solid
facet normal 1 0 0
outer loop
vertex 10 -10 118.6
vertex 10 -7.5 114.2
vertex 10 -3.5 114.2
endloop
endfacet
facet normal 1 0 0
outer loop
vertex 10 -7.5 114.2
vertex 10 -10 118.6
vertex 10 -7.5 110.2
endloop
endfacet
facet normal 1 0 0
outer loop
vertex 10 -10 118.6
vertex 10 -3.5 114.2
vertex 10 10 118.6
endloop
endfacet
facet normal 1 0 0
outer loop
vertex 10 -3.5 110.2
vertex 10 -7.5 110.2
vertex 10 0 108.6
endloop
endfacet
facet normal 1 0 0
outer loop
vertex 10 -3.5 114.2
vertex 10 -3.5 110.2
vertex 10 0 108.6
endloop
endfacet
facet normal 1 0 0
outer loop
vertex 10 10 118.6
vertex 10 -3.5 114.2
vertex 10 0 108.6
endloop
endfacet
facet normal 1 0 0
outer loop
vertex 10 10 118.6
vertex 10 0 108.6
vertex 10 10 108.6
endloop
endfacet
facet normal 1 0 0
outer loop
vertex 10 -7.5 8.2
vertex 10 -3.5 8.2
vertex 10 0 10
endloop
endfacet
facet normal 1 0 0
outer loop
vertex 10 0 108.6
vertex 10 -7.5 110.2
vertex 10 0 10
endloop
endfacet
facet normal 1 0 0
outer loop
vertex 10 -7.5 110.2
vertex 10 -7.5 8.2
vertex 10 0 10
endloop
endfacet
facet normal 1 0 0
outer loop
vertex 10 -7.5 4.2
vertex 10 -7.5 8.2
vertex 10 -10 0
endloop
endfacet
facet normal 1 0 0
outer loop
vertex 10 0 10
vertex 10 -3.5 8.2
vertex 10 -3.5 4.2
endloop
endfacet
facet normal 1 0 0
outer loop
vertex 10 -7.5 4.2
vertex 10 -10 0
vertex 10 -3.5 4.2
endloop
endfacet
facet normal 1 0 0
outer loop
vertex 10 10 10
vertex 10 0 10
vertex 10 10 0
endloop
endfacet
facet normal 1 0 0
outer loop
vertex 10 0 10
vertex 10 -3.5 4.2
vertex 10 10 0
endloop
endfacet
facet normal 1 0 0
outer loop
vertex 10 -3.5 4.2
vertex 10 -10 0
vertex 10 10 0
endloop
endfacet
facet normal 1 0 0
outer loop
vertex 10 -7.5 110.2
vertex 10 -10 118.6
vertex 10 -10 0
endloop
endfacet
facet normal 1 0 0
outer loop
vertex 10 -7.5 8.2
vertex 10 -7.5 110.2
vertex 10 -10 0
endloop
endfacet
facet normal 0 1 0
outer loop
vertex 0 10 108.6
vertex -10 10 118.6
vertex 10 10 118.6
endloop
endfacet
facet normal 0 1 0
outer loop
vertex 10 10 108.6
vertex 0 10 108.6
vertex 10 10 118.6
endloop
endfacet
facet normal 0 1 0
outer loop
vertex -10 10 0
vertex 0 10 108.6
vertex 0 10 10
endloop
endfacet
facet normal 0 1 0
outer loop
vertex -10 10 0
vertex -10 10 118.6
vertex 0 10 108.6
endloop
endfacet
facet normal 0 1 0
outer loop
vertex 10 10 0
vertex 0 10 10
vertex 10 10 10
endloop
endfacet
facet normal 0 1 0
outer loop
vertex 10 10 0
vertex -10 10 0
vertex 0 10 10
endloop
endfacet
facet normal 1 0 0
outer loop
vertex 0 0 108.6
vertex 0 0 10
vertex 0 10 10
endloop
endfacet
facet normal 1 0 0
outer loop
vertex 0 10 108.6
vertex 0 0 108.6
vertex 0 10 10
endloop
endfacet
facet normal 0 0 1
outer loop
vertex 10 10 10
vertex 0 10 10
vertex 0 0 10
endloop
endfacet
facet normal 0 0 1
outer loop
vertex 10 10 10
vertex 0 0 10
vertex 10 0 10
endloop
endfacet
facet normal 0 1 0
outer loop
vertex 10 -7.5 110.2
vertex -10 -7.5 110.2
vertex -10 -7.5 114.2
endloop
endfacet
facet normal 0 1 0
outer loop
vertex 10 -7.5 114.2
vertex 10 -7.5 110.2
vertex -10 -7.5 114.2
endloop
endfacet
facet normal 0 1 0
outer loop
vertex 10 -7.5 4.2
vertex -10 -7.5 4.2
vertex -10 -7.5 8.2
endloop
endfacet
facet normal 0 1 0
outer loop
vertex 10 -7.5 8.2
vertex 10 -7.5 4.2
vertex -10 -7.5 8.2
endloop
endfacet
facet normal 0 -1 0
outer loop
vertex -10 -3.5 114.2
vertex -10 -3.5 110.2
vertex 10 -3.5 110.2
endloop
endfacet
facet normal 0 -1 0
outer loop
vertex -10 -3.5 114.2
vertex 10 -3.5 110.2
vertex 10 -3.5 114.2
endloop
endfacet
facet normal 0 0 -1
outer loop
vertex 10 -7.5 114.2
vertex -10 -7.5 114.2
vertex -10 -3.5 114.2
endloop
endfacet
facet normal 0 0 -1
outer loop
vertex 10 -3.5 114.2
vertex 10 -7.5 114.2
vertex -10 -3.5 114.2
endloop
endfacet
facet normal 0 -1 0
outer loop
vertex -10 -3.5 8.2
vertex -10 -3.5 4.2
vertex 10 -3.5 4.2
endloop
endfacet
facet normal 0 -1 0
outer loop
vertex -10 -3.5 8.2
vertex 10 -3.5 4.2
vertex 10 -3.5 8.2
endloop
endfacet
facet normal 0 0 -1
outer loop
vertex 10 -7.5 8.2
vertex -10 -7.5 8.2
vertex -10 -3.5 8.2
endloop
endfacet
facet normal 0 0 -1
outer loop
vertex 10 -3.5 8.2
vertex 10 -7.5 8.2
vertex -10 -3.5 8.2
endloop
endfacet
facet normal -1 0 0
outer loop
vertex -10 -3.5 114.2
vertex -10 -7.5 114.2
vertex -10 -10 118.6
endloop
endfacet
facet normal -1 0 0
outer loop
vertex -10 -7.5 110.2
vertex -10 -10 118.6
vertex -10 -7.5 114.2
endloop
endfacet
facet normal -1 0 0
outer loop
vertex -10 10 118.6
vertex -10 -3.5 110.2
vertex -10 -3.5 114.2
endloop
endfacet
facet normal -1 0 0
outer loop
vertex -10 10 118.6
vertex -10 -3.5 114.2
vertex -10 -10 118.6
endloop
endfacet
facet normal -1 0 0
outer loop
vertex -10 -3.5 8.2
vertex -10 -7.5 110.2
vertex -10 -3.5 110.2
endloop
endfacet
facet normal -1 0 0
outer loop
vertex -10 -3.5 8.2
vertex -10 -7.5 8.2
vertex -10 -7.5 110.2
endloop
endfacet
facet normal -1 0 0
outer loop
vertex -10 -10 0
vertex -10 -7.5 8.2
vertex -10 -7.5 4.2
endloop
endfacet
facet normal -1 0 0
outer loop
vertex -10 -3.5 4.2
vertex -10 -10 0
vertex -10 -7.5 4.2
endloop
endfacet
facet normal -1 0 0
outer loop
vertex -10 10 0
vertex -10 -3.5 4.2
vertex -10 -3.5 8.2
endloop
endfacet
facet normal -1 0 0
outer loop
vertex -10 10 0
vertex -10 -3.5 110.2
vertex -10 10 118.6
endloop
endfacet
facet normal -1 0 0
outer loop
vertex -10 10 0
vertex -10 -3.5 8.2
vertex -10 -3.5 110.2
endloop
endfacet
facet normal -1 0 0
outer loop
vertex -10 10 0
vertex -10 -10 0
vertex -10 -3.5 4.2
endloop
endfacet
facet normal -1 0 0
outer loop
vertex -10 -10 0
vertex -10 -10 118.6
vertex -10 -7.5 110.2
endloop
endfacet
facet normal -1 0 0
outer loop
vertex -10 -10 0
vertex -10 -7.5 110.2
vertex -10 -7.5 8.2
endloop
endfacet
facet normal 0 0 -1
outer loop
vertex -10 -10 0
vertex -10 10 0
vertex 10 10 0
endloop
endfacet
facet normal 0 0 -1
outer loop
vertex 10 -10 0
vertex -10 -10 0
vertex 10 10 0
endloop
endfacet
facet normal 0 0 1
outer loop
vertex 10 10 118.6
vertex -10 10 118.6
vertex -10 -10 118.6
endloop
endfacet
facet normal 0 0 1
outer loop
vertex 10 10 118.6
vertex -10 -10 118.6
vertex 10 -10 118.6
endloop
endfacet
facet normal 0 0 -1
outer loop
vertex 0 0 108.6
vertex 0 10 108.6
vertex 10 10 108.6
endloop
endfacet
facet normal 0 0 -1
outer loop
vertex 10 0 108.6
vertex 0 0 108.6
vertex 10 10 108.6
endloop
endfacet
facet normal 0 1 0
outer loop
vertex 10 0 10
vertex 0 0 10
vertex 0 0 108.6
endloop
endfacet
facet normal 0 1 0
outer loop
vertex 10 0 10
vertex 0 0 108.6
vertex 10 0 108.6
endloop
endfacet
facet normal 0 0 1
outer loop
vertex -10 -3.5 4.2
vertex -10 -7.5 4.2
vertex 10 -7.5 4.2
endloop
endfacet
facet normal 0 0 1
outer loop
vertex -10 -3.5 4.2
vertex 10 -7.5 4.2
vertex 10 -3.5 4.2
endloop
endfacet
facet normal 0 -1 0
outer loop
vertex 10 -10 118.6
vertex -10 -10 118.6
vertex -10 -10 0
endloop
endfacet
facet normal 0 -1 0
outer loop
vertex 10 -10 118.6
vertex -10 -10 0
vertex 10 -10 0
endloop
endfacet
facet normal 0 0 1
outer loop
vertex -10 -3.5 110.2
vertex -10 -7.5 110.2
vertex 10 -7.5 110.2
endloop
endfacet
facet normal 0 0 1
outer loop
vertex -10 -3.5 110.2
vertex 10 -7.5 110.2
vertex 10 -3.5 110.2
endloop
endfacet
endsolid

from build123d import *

# Parameters (mm, degrees)
BOX_W        = 40
BOX_H        = 40
BOX_DEPTH    = 98.6
BOX001_W     = 20
BOX001_H     = 20
BOX001_DEPTH = 118.6
SKETCH_W     = 4
SKETCH_H     = 4
POCKET_DEPTH = 30


with BuildPart() as battery_hole:
    # Box → Box (new body)
    with BuildSketch(Plane.XY.offset(10)):
        with Locations((20, 20)):
            Rectangle(BOX_W, BOX_H)
    extrude(amount=BOX_DEPTH)


with BuildPart() as pocket:
    # Box001 → Box001 (new body)
    with BuildSketch(Plane(origin=(-10, -10, 0), x_dir=(1, 0, 0), z_dir=(0, 0, 1))):
        with Locations((10, 10)):
            Rectangle(BOX001_W, BOX001_H)
    extrude(amount=BOX001_DEPTH)

    # Cut: cut Battery Hole
    add(battery_hole.part, mode=Mode.SUBTRACT)

    # Sketch → Pocket (cut)
    with BuildSketch(Plane.YZ.offset(10)):
        with Locations((-5.5, 112.2)):
            Rectangle(SKETCH_W, SKETCH_H)
        with Locations((-5.5, 6.2)):
            Rectangle(SKETCH_W, SKETCH_H)
    extrude(amount=-POCKET_DEPTH, mode=Mode.SUBTRACT)


solid = pocket.part
